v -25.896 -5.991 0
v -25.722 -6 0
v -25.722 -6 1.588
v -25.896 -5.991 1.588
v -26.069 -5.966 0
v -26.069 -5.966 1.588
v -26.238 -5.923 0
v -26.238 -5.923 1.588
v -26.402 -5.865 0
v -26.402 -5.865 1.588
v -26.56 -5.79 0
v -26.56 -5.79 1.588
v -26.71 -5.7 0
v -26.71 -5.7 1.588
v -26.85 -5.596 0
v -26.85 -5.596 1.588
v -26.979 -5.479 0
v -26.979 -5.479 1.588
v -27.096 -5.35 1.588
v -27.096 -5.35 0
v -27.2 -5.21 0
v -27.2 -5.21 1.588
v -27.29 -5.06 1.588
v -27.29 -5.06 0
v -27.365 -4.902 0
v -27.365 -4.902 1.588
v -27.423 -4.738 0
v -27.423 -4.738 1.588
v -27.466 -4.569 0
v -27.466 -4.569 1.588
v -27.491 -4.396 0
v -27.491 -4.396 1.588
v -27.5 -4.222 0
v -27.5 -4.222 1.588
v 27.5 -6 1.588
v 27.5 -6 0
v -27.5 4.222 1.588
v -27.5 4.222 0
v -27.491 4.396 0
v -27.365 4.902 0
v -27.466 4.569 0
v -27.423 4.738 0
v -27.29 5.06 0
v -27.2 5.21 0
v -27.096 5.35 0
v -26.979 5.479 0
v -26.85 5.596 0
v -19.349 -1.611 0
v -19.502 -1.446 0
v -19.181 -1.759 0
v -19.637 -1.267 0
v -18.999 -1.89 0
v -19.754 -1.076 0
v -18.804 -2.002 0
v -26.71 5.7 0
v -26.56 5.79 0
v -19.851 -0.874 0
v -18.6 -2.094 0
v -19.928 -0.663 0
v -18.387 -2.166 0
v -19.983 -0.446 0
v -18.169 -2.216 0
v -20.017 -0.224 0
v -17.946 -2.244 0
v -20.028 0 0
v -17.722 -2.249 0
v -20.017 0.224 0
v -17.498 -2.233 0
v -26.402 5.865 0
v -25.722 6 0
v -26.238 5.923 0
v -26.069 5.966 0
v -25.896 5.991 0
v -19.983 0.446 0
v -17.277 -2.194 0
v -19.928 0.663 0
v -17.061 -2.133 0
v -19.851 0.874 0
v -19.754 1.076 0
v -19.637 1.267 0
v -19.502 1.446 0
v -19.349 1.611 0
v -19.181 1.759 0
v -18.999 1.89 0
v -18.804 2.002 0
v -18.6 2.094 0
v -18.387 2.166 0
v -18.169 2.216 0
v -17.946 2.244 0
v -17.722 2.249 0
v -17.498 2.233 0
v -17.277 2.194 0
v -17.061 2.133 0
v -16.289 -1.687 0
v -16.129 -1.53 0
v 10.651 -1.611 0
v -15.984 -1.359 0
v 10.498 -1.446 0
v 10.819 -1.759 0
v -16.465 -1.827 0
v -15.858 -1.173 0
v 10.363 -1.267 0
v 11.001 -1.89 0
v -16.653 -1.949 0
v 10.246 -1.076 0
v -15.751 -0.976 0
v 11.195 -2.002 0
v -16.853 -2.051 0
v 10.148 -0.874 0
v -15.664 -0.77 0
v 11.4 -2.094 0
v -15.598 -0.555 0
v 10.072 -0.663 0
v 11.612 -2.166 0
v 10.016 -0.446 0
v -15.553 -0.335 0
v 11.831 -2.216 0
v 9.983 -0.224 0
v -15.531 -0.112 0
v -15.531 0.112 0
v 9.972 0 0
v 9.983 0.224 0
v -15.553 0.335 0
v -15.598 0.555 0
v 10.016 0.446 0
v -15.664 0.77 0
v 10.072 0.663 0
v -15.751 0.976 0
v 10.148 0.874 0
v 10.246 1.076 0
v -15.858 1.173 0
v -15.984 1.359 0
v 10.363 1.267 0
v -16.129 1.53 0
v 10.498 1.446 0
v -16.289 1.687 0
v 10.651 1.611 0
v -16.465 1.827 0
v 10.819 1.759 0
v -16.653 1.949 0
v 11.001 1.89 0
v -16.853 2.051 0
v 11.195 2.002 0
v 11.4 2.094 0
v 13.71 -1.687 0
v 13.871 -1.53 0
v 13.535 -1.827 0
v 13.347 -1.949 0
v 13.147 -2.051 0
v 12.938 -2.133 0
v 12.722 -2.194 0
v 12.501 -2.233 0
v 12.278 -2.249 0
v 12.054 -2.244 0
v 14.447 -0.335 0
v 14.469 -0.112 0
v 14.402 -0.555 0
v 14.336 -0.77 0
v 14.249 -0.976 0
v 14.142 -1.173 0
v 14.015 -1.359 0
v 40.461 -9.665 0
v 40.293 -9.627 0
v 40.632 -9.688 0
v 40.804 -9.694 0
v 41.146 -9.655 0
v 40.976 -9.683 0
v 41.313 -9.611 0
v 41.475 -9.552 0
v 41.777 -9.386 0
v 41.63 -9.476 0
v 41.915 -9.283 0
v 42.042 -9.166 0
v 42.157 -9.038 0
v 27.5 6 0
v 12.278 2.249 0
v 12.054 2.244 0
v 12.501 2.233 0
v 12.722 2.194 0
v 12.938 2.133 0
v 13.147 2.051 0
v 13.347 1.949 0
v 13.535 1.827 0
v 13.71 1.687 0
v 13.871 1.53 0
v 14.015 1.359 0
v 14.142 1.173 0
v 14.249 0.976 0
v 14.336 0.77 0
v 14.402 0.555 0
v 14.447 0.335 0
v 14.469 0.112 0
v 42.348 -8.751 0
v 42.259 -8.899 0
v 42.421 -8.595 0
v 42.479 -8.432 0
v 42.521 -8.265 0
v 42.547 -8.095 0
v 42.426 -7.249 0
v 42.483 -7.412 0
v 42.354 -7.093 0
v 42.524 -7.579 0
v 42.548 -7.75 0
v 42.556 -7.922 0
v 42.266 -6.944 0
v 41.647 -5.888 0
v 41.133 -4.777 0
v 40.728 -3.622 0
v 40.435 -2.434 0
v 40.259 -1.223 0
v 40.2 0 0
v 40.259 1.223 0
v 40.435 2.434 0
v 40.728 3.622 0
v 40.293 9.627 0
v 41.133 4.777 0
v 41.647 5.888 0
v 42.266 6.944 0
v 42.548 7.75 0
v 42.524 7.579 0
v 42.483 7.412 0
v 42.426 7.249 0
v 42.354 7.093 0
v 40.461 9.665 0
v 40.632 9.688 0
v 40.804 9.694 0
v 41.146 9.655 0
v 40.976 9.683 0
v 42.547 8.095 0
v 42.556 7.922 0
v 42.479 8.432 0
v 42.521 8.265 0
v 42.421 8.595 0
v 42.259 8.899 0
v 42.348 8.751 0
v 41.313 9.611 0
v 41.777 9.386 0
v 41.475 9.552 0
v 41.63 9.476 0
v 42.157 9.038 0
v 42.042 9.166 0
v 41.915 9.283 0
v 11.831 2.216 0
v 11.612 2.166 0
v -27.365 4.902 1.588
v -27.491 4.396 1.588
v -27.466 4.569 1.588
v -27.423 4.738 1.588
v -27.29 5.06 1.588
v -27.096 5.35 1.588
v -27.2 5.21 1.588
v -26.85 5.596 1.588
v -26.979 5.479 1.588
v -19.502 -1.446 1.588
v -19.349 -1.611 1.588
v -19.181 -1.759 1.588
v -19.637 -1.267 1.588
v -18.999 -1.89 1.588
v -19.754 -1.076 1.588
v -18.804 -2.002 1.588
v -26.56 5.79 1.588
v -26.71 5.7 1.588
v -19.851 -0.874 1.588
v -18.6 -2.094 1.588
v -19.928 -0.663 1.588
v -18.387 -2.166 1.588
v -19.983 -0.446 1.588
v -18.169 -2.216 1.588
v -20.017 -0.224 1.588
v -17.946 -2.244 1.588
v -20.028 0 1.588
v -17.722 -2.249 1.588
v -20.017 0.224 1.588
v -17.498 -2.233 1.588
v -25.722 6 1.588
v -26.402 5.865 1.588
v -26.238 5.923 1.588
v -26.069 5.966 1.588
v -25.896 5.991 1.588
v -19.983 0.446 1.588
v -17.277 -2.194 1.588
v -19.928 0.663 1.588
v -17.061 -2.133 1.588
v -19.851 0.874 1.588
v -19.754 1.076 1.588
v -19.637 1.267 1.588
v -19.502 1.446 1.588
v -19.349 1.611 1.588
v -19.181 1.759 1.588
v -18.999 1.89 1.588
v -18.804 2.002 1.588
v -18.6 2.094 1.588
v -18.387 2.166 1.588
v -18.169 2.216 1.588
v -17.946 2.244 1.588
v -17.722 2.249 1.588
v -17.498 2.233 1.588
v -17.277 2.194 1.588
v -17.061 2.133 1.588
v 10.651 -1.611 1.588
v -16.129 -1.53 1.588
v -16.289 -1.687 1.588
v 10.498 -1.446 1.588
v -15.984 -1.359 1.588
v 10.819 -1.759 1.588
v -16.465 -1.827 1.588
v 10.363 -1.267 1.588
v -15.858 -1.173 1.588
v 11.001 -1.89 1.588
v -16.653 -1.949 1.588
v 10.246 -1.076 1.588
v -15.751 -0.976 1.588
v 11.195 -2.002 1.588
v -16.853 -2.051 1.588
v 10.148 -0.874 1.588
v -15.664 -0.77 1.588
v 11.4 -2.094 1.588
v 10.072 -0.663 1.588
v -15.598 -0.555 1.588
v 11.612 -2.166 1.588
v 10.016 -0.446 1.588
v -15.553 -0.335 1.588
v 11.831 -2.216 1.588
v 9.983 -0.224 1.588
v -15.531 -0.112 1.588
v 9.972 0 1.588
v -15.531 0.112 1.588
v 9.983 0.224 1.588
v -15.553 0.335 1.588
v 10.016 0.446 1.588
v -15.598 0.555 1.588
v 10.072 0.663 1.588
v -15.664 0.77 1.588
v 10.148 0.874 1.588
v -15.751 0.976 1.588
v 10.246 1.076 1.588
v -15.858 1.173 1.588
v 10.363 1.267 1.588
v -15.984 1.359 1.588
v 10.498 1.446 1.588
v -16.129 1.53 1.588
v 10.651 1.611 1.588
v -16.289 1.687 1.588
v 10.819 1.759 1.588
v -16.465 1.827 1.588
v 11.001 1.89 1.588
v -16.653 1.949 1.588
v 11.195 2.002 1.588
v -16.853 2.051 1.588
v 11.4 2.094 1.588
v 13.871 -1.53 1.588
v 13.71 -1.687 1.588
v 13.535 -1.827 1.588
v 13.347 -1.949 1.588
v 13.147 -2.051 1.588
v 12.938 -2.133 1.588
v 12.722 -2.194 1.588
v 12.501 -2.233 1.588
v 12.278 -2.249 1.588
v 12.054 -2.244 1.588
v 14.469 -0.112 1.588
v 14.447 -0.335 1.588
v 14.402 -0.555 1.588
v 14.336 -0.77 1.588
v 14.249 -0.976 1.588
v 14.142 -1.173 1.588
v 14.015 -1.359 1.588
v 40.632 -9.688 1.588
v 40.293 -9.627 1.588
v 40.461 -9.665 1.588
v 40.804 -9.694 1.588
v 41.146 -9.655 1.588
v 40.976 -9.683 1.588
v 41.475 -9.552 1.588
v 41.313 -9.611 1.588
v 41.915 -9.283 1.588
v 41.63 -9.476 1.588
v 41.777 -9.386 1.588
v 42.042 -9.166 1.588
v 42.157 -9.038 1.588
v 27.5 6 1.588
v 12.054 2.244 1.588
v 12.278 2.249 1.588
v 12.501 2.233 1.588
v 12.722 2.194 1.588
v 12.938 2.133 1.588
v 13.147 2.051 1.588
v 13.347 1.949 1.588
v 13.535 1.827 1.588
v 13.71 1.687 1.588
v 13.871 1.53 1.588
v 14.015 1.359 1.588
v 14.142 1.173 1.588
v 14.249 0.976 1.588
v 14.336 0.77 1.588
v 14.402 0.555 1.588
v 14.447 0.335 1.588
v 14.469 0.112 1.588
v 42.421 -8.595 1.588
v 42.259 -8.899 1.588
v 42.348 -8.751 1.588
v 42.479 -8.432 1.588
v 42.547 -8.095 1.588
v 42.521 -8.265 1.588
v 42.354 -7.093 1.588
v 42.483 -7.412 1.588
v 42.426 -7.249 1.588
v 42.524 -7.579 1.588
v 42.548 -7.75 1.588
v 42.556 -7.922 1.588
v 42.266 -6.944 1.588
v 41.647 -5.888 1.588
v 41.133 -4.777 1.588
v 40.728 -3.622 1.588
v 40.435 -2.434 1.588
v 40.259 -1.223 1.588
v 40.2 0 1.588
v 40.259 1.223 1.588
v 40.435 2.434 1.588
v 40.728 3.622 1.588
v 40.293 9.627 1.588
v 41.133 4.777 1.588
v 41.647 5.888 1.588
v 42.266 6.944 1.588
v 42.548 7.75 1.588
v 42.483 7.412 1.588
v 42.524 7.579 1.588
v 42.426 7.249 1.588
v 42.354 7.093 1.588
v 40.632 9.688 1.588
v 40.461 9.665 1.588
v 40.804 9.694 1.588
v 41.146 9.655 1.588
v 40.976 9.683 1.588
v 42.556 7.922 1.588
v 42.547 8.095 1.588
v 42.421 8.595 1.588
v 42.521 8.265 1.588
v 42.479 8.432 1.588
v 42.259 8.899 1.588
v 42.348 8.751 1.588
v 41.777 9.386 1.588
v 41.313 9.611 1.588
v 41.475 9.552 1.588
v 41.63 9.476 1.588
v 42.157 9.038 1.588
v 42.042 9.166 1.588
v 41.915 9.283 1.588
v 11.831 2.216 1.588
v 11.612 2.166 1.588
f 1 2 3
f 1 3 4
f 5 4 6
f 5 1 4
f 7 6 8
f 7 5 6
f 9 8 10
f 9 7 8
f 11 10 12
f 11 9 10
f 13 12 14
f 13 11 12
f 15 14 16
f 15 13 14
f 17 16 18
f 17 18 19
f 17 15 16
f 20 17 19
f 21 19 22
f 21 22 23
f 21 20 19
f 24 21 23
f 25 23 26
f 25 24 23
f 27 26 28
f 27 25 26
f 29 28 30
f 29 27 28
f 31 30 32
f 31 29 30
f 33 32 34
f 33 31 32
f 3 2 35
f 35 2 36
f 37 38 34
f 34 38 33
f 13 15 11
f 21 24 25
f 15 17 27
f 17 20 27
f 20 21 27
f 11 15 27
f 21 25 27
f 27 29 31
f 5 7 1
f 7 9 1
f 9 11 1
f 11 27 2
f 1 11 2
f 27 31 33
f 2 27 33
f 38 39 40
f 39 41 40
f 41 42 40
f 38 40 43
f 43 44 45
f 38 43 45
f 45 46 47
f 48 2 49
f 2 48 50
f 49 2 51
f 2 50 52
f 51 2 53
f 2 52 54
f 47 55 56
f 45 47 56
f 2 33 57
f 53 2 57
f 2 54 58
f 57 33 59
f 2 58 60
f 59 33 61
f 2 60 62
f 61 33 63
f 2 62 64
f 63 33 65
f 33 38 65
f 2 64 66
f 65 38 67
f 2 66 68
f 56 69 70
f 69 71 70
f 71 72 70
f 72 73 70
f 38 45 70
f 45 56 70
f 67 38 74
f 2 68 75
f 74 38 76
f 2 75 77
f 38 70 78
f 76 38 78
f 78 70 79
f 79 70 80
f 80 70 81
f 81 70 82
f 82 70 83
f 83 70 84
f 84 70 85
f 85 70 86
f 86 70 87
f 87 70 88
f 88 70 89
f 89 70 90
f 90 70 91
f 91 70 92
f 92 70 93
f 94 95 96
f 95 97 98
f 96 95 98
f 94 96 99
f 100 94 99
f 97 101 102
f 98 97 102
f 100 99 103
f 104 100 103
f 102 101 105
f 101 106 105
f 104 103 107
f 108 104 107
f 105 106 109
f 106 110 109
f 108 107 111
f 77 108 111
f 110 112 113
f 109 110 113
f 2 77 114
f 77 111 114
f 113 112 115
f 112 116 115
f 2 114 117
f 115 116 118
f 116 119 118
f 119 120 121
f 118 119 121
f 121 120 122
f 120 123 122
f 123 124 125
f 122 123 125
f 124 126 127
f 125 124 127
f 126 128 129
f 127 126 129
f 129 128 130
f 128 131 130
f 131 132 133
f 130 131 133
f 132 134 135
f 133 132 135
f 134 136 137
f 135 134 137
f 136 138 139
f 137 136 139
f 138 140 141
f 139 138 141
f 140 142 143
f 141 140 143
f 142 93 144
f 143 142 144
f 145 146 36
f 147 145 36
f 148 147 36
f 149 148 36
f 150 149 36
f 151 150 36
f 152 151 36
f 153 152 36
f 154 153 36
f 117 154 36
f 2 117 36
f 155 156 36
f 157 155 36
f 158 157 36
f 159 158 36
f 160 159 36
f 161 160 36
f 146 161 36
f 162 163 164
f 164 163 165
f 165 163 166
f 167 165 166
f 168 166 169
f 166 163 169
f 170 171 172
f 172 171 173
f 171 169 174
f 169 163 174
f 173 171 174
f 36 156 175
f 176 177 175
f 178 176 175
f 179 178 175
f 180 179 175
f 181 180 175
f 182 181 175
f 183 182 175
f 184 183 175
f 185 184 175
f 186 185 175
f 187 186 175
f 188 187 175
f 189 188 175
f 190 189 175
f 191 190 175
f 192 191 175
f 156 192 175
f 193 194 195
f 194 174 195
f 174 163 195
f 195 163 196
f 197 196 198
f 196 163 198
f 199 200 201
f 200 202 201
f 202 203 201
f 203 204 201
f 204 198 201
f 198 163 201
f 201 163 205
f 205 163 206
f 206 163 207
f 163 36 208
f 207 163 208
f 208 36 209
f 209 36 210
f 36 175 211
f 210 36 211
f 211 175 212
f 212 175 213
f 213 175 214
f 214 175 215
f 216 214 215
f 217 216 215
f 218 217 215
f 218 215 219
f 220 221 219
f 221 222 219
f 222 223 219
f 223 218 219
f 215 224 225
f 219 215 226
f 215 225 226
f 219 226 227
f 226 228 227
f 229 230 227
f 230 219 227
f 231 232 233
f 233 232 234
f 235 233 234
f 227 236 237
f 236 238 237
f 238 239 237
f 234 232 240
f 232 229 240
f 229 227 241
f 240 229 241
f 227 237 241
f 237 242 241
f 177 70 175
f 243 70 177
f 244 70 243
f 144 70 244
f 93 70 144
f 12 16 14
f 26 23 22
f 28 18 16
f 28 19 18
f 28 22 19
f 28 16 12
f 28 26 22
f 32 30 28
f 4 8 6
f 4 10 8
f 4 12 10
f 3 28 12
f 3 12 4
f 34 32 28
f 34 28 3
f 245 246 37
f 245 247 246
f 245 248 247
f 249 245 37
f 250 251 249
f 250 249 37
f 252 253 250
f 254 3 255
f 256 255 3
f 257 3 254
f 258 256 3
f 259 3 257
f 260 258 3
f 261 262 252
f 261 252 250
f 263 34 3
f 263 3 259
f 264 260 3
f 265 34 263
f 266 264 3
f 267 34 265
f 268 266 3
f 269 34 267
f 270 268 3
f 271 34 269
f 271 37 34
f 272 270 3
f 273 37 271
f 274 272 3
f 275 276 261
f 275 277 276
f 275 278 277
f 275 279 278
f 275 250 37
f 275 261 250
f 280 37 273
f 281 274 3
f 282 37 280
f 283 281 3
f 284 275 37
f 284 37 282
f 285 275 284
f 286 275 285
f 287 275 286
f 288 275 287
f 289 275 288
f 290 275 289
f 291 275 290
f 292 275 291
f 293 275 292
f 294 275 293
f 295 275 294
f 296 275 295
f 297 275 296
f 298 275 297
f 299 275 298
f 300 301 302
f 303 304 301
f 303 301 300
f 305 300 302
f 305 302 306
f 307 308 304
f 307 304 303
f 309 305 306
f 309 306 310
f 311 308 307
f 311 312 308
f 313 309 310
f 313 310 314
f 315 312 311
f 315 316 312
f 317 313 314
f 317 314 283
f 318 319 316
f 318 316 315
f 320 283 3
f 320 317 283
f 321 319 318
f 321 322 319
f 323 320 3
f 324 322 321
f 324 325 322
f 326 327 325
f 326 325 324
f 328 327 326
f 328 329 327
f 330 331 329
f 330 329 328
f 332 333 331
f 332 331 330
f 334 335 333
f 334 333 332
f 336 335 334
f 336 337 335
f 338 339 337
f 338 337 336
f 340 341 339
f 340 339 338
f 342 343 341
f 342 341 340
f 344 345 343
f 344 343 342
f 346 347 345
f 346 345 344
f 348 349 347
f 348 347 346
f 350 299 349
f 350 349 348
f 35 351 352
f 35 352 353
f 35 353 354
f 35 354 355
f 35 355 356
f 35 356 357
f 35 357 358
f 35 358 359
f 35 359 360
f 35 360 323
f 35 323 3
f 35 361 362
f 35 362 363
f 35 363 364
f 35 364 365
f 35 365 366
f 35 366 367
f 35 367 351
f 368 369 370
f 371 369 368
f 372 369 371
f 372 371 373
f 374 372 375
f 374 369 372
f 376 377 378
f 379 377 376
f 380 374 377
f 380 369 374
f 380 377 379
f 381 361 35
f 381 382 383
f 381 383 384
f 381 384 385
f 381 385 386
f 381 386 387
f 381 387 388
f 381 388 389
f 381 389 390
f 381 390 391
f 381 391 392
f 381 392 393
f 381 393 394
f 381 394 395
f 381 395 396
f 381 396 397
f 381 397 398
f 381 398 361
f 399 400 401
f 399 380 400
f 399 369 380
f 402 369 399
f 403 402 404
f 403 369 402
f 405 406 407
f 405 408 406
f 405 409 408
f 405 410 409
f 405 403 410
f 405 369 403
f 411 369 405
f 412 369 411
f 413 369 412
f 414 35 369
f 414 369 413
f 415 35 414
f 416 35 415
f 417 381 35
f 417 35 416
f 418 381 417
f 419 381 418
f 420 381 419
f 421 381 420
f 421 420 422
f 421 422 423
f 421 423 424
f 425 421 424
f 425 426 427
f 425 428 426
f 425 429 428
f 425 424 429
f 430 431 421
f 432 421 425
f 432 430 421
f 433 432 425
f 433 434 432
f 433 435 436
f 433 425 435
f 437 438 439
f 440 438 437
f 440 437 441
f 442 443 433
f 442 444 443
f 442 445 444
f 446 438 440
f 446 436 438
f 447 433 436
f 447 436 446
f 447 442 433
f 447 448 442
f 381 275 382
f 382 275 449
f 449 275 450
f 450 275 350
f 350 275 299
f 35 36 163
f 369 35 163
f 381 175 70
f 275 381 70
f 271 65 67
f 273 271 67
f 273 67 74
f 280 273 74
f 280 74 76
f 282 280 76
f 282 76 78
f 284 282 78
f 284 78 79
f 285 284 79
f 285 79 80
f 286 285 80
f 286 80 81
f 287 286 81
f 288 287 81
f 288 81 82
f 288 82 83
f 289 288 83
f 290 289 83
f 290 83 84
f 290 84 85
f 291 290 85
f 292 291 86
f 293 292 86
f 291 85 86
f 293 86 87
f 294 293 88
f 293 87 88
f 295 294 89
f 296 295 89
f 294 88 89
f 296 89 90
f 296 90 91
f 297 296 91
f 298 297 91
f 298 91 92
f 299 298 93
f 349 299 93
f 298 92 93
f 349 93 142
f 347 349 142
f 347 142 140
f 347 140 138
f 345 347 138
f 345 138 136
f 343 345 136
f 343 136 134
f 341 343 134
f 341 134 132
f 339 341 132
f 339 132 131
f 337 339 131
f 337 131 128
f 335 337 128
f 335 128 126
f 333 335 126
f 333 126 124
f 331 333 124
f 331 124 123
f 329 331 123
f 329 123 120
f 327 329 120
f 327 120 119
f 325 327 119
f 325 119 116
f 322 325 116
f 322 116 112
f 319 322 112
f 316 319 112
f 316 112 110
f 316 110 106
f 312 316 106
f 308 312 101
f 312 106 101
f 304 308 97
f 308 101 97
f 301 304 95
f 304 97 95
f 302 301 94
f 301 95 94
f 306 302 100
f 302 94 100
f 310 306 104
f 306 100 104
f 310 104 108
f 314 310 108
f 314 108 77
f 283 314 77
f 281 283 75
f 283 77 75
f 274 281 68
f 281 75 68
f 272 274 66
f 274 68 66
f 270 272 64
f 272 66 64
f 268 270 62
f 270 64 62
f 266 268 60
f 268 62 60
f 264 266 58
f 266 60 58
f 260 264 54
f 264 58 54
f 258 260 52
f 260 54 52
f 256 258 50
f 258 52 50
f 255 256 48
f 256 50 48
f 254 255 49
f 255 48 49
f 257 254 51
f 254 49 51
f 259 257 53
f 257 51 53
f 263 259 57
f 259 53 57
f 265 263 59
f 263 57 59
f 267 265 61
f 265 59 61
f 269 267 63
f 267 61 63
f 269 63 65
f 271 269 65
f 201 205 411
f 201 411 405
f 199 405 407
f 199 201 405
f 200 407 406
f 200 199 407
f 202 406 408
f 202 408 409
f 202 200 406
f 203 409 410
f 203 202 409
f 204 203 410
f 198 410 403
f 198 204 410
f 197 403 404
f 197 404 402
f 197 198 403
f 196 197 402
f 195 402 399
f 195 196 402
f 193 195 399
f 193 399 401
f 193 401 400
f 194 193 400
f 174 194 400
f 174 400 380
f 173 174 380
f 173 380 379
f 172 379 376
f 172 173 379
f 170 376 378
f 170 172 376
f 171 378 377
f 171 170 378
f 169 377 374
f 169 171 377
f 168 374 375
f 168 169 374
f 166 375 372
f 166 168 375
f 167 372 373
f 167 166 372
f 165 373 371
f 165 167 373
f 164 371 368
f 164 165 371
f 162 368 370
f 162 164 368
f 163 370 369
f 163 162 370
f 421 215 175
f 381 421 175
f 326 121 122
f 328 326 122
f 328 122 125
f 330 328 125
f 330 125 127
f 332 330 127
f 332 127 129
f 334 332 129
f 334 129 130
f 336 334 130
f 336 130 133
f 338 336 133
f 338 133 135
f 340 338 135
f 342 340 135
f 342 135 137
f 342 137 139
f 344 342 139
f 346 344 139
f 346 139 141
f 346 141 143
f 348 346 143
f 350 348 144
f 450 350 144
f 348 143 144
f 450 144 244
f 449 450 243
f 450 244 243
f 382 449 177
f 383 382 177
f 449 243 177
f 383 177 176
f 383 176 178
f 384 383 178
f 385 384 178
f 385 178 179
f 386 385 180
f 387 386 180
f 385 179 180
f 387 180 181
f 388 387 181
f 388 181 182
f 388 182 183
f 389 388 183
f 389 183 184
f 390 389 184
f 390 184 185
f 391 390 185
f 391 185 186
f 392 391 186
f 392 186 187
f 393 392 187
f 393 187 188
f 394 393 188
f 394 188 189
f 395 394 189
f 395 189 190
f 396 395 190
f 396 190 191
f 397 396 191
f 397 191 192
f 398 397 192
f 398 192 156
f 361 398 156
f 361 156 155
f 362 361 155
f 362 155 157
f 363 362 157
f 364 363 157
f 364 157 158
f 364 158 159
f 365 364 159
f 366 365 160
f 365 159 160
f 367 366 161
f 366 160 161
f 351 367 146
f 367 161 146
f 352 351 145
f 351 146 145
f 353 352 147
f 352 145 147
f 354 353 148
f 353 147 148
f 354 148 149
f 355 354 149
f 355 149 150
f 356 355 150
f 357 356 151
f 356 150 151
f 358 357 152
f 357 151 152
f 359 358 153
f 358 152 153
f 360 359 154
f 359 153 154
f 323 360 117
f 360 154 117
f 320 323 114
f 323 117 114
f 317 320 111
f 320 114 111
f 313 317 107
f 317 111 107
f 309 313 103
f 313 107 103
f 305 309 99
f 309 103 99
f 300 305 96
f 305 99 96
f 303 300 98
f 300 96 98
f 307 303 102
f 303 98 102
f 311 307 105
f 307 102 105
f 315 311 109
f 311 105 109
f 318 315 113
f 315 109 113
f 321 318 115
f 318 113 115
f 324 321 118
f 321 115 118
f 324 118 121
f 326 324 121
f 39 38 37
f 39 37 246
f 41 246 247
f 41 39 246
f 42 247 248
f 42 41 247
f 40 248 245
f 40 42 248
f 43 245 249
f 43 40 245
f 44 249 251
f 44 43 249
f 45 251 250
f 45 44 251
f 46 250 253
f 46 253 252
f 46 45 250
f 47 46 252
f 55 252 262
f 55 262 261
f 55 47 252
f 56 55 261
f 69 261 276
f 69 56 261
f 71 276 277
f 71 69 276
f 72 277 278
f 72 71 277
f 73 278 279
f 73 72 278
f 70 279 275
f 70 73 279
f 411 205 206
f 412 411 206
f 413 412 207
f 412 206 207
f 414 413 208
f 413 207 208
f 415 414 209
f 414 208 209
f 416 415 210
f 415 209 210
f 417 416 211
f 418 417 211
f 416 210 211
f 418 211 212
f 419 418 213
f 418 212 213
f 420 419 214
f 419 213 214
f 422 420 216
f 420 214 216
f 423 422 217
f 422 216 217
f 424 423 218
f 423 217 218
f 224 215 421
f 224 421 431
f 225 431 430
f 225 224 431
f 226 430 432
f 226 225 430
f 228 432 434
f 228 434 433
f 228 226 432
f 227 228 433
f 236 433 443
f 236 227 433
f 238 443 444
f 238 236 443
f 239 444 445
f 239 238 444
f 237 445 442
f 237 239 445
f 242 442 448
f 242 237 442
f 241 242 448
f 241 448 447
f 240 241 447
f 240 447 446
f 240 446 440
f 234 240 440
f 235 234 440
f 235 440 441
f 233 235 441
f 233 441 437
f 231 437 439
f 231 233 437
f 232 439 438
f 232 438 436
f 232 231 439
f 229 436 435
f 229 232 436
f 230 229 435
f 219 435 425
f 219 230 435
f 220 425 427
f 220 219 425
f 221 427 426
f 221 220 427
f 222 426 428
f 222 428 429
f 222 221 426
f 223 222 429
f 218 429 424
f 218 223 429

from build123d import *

# Parameters (mm, degrees)
BOSS_EXTRUDE1_DEPTH  = 1.5875
FILLET2_DEPTH        = 1.5875
M4_CLEARANCE_HOLE1_D = 4.5


with BuildPart() as part:
    # Sketch1 → Boss-Extrude1 (new body)
    with BuildSketch(Plane.XY):
        with BuildLine():
            Line((27.5, 6), (-27.5, 6))
            Line((-27.5, 6), (-27.5, -6))
            Line((-27.5, -6), (27.5, -6))
            Line((27.5, -6), (49.436268592, -12.218533657))
            ThreePointArc((49.436268592, -12.218533657), (40.2, -4.45e-07), (49.436267736, 12.218533415))
            Line((49.436267736, 12.218533415), (27.5, 6))
        make_face()
    extrude(amount=BOSS_EXTRUDE1_DEPTH)

    # Fillet2: read off the stored shape, not the designer's step
    # Fillet2 outline → Fillet2 (cut)
    with BuildSketch(Plane.XY):
        with BuildLine():
            ThreePointArc((-27.5, 4.222), (-26.979235857, 5.479235857), (-25.722, 6))
            Line((-25.722, 6), (-27.5, 6))
            Line((-27.5, 6), (-27.5, 4.222))
        make_face()
        with BuildLine():
            ThreePointArc((-25.722, -6), (-26.979235857, -5.479235857), (-27.5, -4.222))
            Line((-27.5, -4.222), (-27.5, -6))
            Line((-27.5, -6), (-25.722, -6))
        make_face()
        with BuildLine():
            Line((49.436267736, 12.218533415), (40.292754575, 9.626513532))
            ThreePointArc((40.292754575, 9.626513532), (42.209860363, 8.969548331), (42.266383414, 6.943788468))
            ThreePointArc((42.266383414, 6.943788468), (45.374075159, 10.229880512), (49.436267736, 12.218533415))
        make_face()
        with BuildLine():
            ThreePointArc((49.436267736, -12.218533415), (45.374075159, -10.229880512), (42.266383413, -6.943788468))
            ThreePointArc((42.266383413, -6.943788468), (42.209860363, -8.969548331), (40.292754575, -9.626513532))
            Line((40.292754575, -9.626513532), (49.436267736, -12.218533415))
        make_face()
    extrude(amount=FILLET2_DEPTH, mode=Mode.SUBTRACT)

    # M4 Clearance Hole1 (through all)
    with Locations(Plane.XY.offset(1.5875)):
        with Locations((-17.778, 0), (12.221650814, 0)):
            Hole(M4_CLEARANCE_HOLE1_D / 2)


solid = part.part
